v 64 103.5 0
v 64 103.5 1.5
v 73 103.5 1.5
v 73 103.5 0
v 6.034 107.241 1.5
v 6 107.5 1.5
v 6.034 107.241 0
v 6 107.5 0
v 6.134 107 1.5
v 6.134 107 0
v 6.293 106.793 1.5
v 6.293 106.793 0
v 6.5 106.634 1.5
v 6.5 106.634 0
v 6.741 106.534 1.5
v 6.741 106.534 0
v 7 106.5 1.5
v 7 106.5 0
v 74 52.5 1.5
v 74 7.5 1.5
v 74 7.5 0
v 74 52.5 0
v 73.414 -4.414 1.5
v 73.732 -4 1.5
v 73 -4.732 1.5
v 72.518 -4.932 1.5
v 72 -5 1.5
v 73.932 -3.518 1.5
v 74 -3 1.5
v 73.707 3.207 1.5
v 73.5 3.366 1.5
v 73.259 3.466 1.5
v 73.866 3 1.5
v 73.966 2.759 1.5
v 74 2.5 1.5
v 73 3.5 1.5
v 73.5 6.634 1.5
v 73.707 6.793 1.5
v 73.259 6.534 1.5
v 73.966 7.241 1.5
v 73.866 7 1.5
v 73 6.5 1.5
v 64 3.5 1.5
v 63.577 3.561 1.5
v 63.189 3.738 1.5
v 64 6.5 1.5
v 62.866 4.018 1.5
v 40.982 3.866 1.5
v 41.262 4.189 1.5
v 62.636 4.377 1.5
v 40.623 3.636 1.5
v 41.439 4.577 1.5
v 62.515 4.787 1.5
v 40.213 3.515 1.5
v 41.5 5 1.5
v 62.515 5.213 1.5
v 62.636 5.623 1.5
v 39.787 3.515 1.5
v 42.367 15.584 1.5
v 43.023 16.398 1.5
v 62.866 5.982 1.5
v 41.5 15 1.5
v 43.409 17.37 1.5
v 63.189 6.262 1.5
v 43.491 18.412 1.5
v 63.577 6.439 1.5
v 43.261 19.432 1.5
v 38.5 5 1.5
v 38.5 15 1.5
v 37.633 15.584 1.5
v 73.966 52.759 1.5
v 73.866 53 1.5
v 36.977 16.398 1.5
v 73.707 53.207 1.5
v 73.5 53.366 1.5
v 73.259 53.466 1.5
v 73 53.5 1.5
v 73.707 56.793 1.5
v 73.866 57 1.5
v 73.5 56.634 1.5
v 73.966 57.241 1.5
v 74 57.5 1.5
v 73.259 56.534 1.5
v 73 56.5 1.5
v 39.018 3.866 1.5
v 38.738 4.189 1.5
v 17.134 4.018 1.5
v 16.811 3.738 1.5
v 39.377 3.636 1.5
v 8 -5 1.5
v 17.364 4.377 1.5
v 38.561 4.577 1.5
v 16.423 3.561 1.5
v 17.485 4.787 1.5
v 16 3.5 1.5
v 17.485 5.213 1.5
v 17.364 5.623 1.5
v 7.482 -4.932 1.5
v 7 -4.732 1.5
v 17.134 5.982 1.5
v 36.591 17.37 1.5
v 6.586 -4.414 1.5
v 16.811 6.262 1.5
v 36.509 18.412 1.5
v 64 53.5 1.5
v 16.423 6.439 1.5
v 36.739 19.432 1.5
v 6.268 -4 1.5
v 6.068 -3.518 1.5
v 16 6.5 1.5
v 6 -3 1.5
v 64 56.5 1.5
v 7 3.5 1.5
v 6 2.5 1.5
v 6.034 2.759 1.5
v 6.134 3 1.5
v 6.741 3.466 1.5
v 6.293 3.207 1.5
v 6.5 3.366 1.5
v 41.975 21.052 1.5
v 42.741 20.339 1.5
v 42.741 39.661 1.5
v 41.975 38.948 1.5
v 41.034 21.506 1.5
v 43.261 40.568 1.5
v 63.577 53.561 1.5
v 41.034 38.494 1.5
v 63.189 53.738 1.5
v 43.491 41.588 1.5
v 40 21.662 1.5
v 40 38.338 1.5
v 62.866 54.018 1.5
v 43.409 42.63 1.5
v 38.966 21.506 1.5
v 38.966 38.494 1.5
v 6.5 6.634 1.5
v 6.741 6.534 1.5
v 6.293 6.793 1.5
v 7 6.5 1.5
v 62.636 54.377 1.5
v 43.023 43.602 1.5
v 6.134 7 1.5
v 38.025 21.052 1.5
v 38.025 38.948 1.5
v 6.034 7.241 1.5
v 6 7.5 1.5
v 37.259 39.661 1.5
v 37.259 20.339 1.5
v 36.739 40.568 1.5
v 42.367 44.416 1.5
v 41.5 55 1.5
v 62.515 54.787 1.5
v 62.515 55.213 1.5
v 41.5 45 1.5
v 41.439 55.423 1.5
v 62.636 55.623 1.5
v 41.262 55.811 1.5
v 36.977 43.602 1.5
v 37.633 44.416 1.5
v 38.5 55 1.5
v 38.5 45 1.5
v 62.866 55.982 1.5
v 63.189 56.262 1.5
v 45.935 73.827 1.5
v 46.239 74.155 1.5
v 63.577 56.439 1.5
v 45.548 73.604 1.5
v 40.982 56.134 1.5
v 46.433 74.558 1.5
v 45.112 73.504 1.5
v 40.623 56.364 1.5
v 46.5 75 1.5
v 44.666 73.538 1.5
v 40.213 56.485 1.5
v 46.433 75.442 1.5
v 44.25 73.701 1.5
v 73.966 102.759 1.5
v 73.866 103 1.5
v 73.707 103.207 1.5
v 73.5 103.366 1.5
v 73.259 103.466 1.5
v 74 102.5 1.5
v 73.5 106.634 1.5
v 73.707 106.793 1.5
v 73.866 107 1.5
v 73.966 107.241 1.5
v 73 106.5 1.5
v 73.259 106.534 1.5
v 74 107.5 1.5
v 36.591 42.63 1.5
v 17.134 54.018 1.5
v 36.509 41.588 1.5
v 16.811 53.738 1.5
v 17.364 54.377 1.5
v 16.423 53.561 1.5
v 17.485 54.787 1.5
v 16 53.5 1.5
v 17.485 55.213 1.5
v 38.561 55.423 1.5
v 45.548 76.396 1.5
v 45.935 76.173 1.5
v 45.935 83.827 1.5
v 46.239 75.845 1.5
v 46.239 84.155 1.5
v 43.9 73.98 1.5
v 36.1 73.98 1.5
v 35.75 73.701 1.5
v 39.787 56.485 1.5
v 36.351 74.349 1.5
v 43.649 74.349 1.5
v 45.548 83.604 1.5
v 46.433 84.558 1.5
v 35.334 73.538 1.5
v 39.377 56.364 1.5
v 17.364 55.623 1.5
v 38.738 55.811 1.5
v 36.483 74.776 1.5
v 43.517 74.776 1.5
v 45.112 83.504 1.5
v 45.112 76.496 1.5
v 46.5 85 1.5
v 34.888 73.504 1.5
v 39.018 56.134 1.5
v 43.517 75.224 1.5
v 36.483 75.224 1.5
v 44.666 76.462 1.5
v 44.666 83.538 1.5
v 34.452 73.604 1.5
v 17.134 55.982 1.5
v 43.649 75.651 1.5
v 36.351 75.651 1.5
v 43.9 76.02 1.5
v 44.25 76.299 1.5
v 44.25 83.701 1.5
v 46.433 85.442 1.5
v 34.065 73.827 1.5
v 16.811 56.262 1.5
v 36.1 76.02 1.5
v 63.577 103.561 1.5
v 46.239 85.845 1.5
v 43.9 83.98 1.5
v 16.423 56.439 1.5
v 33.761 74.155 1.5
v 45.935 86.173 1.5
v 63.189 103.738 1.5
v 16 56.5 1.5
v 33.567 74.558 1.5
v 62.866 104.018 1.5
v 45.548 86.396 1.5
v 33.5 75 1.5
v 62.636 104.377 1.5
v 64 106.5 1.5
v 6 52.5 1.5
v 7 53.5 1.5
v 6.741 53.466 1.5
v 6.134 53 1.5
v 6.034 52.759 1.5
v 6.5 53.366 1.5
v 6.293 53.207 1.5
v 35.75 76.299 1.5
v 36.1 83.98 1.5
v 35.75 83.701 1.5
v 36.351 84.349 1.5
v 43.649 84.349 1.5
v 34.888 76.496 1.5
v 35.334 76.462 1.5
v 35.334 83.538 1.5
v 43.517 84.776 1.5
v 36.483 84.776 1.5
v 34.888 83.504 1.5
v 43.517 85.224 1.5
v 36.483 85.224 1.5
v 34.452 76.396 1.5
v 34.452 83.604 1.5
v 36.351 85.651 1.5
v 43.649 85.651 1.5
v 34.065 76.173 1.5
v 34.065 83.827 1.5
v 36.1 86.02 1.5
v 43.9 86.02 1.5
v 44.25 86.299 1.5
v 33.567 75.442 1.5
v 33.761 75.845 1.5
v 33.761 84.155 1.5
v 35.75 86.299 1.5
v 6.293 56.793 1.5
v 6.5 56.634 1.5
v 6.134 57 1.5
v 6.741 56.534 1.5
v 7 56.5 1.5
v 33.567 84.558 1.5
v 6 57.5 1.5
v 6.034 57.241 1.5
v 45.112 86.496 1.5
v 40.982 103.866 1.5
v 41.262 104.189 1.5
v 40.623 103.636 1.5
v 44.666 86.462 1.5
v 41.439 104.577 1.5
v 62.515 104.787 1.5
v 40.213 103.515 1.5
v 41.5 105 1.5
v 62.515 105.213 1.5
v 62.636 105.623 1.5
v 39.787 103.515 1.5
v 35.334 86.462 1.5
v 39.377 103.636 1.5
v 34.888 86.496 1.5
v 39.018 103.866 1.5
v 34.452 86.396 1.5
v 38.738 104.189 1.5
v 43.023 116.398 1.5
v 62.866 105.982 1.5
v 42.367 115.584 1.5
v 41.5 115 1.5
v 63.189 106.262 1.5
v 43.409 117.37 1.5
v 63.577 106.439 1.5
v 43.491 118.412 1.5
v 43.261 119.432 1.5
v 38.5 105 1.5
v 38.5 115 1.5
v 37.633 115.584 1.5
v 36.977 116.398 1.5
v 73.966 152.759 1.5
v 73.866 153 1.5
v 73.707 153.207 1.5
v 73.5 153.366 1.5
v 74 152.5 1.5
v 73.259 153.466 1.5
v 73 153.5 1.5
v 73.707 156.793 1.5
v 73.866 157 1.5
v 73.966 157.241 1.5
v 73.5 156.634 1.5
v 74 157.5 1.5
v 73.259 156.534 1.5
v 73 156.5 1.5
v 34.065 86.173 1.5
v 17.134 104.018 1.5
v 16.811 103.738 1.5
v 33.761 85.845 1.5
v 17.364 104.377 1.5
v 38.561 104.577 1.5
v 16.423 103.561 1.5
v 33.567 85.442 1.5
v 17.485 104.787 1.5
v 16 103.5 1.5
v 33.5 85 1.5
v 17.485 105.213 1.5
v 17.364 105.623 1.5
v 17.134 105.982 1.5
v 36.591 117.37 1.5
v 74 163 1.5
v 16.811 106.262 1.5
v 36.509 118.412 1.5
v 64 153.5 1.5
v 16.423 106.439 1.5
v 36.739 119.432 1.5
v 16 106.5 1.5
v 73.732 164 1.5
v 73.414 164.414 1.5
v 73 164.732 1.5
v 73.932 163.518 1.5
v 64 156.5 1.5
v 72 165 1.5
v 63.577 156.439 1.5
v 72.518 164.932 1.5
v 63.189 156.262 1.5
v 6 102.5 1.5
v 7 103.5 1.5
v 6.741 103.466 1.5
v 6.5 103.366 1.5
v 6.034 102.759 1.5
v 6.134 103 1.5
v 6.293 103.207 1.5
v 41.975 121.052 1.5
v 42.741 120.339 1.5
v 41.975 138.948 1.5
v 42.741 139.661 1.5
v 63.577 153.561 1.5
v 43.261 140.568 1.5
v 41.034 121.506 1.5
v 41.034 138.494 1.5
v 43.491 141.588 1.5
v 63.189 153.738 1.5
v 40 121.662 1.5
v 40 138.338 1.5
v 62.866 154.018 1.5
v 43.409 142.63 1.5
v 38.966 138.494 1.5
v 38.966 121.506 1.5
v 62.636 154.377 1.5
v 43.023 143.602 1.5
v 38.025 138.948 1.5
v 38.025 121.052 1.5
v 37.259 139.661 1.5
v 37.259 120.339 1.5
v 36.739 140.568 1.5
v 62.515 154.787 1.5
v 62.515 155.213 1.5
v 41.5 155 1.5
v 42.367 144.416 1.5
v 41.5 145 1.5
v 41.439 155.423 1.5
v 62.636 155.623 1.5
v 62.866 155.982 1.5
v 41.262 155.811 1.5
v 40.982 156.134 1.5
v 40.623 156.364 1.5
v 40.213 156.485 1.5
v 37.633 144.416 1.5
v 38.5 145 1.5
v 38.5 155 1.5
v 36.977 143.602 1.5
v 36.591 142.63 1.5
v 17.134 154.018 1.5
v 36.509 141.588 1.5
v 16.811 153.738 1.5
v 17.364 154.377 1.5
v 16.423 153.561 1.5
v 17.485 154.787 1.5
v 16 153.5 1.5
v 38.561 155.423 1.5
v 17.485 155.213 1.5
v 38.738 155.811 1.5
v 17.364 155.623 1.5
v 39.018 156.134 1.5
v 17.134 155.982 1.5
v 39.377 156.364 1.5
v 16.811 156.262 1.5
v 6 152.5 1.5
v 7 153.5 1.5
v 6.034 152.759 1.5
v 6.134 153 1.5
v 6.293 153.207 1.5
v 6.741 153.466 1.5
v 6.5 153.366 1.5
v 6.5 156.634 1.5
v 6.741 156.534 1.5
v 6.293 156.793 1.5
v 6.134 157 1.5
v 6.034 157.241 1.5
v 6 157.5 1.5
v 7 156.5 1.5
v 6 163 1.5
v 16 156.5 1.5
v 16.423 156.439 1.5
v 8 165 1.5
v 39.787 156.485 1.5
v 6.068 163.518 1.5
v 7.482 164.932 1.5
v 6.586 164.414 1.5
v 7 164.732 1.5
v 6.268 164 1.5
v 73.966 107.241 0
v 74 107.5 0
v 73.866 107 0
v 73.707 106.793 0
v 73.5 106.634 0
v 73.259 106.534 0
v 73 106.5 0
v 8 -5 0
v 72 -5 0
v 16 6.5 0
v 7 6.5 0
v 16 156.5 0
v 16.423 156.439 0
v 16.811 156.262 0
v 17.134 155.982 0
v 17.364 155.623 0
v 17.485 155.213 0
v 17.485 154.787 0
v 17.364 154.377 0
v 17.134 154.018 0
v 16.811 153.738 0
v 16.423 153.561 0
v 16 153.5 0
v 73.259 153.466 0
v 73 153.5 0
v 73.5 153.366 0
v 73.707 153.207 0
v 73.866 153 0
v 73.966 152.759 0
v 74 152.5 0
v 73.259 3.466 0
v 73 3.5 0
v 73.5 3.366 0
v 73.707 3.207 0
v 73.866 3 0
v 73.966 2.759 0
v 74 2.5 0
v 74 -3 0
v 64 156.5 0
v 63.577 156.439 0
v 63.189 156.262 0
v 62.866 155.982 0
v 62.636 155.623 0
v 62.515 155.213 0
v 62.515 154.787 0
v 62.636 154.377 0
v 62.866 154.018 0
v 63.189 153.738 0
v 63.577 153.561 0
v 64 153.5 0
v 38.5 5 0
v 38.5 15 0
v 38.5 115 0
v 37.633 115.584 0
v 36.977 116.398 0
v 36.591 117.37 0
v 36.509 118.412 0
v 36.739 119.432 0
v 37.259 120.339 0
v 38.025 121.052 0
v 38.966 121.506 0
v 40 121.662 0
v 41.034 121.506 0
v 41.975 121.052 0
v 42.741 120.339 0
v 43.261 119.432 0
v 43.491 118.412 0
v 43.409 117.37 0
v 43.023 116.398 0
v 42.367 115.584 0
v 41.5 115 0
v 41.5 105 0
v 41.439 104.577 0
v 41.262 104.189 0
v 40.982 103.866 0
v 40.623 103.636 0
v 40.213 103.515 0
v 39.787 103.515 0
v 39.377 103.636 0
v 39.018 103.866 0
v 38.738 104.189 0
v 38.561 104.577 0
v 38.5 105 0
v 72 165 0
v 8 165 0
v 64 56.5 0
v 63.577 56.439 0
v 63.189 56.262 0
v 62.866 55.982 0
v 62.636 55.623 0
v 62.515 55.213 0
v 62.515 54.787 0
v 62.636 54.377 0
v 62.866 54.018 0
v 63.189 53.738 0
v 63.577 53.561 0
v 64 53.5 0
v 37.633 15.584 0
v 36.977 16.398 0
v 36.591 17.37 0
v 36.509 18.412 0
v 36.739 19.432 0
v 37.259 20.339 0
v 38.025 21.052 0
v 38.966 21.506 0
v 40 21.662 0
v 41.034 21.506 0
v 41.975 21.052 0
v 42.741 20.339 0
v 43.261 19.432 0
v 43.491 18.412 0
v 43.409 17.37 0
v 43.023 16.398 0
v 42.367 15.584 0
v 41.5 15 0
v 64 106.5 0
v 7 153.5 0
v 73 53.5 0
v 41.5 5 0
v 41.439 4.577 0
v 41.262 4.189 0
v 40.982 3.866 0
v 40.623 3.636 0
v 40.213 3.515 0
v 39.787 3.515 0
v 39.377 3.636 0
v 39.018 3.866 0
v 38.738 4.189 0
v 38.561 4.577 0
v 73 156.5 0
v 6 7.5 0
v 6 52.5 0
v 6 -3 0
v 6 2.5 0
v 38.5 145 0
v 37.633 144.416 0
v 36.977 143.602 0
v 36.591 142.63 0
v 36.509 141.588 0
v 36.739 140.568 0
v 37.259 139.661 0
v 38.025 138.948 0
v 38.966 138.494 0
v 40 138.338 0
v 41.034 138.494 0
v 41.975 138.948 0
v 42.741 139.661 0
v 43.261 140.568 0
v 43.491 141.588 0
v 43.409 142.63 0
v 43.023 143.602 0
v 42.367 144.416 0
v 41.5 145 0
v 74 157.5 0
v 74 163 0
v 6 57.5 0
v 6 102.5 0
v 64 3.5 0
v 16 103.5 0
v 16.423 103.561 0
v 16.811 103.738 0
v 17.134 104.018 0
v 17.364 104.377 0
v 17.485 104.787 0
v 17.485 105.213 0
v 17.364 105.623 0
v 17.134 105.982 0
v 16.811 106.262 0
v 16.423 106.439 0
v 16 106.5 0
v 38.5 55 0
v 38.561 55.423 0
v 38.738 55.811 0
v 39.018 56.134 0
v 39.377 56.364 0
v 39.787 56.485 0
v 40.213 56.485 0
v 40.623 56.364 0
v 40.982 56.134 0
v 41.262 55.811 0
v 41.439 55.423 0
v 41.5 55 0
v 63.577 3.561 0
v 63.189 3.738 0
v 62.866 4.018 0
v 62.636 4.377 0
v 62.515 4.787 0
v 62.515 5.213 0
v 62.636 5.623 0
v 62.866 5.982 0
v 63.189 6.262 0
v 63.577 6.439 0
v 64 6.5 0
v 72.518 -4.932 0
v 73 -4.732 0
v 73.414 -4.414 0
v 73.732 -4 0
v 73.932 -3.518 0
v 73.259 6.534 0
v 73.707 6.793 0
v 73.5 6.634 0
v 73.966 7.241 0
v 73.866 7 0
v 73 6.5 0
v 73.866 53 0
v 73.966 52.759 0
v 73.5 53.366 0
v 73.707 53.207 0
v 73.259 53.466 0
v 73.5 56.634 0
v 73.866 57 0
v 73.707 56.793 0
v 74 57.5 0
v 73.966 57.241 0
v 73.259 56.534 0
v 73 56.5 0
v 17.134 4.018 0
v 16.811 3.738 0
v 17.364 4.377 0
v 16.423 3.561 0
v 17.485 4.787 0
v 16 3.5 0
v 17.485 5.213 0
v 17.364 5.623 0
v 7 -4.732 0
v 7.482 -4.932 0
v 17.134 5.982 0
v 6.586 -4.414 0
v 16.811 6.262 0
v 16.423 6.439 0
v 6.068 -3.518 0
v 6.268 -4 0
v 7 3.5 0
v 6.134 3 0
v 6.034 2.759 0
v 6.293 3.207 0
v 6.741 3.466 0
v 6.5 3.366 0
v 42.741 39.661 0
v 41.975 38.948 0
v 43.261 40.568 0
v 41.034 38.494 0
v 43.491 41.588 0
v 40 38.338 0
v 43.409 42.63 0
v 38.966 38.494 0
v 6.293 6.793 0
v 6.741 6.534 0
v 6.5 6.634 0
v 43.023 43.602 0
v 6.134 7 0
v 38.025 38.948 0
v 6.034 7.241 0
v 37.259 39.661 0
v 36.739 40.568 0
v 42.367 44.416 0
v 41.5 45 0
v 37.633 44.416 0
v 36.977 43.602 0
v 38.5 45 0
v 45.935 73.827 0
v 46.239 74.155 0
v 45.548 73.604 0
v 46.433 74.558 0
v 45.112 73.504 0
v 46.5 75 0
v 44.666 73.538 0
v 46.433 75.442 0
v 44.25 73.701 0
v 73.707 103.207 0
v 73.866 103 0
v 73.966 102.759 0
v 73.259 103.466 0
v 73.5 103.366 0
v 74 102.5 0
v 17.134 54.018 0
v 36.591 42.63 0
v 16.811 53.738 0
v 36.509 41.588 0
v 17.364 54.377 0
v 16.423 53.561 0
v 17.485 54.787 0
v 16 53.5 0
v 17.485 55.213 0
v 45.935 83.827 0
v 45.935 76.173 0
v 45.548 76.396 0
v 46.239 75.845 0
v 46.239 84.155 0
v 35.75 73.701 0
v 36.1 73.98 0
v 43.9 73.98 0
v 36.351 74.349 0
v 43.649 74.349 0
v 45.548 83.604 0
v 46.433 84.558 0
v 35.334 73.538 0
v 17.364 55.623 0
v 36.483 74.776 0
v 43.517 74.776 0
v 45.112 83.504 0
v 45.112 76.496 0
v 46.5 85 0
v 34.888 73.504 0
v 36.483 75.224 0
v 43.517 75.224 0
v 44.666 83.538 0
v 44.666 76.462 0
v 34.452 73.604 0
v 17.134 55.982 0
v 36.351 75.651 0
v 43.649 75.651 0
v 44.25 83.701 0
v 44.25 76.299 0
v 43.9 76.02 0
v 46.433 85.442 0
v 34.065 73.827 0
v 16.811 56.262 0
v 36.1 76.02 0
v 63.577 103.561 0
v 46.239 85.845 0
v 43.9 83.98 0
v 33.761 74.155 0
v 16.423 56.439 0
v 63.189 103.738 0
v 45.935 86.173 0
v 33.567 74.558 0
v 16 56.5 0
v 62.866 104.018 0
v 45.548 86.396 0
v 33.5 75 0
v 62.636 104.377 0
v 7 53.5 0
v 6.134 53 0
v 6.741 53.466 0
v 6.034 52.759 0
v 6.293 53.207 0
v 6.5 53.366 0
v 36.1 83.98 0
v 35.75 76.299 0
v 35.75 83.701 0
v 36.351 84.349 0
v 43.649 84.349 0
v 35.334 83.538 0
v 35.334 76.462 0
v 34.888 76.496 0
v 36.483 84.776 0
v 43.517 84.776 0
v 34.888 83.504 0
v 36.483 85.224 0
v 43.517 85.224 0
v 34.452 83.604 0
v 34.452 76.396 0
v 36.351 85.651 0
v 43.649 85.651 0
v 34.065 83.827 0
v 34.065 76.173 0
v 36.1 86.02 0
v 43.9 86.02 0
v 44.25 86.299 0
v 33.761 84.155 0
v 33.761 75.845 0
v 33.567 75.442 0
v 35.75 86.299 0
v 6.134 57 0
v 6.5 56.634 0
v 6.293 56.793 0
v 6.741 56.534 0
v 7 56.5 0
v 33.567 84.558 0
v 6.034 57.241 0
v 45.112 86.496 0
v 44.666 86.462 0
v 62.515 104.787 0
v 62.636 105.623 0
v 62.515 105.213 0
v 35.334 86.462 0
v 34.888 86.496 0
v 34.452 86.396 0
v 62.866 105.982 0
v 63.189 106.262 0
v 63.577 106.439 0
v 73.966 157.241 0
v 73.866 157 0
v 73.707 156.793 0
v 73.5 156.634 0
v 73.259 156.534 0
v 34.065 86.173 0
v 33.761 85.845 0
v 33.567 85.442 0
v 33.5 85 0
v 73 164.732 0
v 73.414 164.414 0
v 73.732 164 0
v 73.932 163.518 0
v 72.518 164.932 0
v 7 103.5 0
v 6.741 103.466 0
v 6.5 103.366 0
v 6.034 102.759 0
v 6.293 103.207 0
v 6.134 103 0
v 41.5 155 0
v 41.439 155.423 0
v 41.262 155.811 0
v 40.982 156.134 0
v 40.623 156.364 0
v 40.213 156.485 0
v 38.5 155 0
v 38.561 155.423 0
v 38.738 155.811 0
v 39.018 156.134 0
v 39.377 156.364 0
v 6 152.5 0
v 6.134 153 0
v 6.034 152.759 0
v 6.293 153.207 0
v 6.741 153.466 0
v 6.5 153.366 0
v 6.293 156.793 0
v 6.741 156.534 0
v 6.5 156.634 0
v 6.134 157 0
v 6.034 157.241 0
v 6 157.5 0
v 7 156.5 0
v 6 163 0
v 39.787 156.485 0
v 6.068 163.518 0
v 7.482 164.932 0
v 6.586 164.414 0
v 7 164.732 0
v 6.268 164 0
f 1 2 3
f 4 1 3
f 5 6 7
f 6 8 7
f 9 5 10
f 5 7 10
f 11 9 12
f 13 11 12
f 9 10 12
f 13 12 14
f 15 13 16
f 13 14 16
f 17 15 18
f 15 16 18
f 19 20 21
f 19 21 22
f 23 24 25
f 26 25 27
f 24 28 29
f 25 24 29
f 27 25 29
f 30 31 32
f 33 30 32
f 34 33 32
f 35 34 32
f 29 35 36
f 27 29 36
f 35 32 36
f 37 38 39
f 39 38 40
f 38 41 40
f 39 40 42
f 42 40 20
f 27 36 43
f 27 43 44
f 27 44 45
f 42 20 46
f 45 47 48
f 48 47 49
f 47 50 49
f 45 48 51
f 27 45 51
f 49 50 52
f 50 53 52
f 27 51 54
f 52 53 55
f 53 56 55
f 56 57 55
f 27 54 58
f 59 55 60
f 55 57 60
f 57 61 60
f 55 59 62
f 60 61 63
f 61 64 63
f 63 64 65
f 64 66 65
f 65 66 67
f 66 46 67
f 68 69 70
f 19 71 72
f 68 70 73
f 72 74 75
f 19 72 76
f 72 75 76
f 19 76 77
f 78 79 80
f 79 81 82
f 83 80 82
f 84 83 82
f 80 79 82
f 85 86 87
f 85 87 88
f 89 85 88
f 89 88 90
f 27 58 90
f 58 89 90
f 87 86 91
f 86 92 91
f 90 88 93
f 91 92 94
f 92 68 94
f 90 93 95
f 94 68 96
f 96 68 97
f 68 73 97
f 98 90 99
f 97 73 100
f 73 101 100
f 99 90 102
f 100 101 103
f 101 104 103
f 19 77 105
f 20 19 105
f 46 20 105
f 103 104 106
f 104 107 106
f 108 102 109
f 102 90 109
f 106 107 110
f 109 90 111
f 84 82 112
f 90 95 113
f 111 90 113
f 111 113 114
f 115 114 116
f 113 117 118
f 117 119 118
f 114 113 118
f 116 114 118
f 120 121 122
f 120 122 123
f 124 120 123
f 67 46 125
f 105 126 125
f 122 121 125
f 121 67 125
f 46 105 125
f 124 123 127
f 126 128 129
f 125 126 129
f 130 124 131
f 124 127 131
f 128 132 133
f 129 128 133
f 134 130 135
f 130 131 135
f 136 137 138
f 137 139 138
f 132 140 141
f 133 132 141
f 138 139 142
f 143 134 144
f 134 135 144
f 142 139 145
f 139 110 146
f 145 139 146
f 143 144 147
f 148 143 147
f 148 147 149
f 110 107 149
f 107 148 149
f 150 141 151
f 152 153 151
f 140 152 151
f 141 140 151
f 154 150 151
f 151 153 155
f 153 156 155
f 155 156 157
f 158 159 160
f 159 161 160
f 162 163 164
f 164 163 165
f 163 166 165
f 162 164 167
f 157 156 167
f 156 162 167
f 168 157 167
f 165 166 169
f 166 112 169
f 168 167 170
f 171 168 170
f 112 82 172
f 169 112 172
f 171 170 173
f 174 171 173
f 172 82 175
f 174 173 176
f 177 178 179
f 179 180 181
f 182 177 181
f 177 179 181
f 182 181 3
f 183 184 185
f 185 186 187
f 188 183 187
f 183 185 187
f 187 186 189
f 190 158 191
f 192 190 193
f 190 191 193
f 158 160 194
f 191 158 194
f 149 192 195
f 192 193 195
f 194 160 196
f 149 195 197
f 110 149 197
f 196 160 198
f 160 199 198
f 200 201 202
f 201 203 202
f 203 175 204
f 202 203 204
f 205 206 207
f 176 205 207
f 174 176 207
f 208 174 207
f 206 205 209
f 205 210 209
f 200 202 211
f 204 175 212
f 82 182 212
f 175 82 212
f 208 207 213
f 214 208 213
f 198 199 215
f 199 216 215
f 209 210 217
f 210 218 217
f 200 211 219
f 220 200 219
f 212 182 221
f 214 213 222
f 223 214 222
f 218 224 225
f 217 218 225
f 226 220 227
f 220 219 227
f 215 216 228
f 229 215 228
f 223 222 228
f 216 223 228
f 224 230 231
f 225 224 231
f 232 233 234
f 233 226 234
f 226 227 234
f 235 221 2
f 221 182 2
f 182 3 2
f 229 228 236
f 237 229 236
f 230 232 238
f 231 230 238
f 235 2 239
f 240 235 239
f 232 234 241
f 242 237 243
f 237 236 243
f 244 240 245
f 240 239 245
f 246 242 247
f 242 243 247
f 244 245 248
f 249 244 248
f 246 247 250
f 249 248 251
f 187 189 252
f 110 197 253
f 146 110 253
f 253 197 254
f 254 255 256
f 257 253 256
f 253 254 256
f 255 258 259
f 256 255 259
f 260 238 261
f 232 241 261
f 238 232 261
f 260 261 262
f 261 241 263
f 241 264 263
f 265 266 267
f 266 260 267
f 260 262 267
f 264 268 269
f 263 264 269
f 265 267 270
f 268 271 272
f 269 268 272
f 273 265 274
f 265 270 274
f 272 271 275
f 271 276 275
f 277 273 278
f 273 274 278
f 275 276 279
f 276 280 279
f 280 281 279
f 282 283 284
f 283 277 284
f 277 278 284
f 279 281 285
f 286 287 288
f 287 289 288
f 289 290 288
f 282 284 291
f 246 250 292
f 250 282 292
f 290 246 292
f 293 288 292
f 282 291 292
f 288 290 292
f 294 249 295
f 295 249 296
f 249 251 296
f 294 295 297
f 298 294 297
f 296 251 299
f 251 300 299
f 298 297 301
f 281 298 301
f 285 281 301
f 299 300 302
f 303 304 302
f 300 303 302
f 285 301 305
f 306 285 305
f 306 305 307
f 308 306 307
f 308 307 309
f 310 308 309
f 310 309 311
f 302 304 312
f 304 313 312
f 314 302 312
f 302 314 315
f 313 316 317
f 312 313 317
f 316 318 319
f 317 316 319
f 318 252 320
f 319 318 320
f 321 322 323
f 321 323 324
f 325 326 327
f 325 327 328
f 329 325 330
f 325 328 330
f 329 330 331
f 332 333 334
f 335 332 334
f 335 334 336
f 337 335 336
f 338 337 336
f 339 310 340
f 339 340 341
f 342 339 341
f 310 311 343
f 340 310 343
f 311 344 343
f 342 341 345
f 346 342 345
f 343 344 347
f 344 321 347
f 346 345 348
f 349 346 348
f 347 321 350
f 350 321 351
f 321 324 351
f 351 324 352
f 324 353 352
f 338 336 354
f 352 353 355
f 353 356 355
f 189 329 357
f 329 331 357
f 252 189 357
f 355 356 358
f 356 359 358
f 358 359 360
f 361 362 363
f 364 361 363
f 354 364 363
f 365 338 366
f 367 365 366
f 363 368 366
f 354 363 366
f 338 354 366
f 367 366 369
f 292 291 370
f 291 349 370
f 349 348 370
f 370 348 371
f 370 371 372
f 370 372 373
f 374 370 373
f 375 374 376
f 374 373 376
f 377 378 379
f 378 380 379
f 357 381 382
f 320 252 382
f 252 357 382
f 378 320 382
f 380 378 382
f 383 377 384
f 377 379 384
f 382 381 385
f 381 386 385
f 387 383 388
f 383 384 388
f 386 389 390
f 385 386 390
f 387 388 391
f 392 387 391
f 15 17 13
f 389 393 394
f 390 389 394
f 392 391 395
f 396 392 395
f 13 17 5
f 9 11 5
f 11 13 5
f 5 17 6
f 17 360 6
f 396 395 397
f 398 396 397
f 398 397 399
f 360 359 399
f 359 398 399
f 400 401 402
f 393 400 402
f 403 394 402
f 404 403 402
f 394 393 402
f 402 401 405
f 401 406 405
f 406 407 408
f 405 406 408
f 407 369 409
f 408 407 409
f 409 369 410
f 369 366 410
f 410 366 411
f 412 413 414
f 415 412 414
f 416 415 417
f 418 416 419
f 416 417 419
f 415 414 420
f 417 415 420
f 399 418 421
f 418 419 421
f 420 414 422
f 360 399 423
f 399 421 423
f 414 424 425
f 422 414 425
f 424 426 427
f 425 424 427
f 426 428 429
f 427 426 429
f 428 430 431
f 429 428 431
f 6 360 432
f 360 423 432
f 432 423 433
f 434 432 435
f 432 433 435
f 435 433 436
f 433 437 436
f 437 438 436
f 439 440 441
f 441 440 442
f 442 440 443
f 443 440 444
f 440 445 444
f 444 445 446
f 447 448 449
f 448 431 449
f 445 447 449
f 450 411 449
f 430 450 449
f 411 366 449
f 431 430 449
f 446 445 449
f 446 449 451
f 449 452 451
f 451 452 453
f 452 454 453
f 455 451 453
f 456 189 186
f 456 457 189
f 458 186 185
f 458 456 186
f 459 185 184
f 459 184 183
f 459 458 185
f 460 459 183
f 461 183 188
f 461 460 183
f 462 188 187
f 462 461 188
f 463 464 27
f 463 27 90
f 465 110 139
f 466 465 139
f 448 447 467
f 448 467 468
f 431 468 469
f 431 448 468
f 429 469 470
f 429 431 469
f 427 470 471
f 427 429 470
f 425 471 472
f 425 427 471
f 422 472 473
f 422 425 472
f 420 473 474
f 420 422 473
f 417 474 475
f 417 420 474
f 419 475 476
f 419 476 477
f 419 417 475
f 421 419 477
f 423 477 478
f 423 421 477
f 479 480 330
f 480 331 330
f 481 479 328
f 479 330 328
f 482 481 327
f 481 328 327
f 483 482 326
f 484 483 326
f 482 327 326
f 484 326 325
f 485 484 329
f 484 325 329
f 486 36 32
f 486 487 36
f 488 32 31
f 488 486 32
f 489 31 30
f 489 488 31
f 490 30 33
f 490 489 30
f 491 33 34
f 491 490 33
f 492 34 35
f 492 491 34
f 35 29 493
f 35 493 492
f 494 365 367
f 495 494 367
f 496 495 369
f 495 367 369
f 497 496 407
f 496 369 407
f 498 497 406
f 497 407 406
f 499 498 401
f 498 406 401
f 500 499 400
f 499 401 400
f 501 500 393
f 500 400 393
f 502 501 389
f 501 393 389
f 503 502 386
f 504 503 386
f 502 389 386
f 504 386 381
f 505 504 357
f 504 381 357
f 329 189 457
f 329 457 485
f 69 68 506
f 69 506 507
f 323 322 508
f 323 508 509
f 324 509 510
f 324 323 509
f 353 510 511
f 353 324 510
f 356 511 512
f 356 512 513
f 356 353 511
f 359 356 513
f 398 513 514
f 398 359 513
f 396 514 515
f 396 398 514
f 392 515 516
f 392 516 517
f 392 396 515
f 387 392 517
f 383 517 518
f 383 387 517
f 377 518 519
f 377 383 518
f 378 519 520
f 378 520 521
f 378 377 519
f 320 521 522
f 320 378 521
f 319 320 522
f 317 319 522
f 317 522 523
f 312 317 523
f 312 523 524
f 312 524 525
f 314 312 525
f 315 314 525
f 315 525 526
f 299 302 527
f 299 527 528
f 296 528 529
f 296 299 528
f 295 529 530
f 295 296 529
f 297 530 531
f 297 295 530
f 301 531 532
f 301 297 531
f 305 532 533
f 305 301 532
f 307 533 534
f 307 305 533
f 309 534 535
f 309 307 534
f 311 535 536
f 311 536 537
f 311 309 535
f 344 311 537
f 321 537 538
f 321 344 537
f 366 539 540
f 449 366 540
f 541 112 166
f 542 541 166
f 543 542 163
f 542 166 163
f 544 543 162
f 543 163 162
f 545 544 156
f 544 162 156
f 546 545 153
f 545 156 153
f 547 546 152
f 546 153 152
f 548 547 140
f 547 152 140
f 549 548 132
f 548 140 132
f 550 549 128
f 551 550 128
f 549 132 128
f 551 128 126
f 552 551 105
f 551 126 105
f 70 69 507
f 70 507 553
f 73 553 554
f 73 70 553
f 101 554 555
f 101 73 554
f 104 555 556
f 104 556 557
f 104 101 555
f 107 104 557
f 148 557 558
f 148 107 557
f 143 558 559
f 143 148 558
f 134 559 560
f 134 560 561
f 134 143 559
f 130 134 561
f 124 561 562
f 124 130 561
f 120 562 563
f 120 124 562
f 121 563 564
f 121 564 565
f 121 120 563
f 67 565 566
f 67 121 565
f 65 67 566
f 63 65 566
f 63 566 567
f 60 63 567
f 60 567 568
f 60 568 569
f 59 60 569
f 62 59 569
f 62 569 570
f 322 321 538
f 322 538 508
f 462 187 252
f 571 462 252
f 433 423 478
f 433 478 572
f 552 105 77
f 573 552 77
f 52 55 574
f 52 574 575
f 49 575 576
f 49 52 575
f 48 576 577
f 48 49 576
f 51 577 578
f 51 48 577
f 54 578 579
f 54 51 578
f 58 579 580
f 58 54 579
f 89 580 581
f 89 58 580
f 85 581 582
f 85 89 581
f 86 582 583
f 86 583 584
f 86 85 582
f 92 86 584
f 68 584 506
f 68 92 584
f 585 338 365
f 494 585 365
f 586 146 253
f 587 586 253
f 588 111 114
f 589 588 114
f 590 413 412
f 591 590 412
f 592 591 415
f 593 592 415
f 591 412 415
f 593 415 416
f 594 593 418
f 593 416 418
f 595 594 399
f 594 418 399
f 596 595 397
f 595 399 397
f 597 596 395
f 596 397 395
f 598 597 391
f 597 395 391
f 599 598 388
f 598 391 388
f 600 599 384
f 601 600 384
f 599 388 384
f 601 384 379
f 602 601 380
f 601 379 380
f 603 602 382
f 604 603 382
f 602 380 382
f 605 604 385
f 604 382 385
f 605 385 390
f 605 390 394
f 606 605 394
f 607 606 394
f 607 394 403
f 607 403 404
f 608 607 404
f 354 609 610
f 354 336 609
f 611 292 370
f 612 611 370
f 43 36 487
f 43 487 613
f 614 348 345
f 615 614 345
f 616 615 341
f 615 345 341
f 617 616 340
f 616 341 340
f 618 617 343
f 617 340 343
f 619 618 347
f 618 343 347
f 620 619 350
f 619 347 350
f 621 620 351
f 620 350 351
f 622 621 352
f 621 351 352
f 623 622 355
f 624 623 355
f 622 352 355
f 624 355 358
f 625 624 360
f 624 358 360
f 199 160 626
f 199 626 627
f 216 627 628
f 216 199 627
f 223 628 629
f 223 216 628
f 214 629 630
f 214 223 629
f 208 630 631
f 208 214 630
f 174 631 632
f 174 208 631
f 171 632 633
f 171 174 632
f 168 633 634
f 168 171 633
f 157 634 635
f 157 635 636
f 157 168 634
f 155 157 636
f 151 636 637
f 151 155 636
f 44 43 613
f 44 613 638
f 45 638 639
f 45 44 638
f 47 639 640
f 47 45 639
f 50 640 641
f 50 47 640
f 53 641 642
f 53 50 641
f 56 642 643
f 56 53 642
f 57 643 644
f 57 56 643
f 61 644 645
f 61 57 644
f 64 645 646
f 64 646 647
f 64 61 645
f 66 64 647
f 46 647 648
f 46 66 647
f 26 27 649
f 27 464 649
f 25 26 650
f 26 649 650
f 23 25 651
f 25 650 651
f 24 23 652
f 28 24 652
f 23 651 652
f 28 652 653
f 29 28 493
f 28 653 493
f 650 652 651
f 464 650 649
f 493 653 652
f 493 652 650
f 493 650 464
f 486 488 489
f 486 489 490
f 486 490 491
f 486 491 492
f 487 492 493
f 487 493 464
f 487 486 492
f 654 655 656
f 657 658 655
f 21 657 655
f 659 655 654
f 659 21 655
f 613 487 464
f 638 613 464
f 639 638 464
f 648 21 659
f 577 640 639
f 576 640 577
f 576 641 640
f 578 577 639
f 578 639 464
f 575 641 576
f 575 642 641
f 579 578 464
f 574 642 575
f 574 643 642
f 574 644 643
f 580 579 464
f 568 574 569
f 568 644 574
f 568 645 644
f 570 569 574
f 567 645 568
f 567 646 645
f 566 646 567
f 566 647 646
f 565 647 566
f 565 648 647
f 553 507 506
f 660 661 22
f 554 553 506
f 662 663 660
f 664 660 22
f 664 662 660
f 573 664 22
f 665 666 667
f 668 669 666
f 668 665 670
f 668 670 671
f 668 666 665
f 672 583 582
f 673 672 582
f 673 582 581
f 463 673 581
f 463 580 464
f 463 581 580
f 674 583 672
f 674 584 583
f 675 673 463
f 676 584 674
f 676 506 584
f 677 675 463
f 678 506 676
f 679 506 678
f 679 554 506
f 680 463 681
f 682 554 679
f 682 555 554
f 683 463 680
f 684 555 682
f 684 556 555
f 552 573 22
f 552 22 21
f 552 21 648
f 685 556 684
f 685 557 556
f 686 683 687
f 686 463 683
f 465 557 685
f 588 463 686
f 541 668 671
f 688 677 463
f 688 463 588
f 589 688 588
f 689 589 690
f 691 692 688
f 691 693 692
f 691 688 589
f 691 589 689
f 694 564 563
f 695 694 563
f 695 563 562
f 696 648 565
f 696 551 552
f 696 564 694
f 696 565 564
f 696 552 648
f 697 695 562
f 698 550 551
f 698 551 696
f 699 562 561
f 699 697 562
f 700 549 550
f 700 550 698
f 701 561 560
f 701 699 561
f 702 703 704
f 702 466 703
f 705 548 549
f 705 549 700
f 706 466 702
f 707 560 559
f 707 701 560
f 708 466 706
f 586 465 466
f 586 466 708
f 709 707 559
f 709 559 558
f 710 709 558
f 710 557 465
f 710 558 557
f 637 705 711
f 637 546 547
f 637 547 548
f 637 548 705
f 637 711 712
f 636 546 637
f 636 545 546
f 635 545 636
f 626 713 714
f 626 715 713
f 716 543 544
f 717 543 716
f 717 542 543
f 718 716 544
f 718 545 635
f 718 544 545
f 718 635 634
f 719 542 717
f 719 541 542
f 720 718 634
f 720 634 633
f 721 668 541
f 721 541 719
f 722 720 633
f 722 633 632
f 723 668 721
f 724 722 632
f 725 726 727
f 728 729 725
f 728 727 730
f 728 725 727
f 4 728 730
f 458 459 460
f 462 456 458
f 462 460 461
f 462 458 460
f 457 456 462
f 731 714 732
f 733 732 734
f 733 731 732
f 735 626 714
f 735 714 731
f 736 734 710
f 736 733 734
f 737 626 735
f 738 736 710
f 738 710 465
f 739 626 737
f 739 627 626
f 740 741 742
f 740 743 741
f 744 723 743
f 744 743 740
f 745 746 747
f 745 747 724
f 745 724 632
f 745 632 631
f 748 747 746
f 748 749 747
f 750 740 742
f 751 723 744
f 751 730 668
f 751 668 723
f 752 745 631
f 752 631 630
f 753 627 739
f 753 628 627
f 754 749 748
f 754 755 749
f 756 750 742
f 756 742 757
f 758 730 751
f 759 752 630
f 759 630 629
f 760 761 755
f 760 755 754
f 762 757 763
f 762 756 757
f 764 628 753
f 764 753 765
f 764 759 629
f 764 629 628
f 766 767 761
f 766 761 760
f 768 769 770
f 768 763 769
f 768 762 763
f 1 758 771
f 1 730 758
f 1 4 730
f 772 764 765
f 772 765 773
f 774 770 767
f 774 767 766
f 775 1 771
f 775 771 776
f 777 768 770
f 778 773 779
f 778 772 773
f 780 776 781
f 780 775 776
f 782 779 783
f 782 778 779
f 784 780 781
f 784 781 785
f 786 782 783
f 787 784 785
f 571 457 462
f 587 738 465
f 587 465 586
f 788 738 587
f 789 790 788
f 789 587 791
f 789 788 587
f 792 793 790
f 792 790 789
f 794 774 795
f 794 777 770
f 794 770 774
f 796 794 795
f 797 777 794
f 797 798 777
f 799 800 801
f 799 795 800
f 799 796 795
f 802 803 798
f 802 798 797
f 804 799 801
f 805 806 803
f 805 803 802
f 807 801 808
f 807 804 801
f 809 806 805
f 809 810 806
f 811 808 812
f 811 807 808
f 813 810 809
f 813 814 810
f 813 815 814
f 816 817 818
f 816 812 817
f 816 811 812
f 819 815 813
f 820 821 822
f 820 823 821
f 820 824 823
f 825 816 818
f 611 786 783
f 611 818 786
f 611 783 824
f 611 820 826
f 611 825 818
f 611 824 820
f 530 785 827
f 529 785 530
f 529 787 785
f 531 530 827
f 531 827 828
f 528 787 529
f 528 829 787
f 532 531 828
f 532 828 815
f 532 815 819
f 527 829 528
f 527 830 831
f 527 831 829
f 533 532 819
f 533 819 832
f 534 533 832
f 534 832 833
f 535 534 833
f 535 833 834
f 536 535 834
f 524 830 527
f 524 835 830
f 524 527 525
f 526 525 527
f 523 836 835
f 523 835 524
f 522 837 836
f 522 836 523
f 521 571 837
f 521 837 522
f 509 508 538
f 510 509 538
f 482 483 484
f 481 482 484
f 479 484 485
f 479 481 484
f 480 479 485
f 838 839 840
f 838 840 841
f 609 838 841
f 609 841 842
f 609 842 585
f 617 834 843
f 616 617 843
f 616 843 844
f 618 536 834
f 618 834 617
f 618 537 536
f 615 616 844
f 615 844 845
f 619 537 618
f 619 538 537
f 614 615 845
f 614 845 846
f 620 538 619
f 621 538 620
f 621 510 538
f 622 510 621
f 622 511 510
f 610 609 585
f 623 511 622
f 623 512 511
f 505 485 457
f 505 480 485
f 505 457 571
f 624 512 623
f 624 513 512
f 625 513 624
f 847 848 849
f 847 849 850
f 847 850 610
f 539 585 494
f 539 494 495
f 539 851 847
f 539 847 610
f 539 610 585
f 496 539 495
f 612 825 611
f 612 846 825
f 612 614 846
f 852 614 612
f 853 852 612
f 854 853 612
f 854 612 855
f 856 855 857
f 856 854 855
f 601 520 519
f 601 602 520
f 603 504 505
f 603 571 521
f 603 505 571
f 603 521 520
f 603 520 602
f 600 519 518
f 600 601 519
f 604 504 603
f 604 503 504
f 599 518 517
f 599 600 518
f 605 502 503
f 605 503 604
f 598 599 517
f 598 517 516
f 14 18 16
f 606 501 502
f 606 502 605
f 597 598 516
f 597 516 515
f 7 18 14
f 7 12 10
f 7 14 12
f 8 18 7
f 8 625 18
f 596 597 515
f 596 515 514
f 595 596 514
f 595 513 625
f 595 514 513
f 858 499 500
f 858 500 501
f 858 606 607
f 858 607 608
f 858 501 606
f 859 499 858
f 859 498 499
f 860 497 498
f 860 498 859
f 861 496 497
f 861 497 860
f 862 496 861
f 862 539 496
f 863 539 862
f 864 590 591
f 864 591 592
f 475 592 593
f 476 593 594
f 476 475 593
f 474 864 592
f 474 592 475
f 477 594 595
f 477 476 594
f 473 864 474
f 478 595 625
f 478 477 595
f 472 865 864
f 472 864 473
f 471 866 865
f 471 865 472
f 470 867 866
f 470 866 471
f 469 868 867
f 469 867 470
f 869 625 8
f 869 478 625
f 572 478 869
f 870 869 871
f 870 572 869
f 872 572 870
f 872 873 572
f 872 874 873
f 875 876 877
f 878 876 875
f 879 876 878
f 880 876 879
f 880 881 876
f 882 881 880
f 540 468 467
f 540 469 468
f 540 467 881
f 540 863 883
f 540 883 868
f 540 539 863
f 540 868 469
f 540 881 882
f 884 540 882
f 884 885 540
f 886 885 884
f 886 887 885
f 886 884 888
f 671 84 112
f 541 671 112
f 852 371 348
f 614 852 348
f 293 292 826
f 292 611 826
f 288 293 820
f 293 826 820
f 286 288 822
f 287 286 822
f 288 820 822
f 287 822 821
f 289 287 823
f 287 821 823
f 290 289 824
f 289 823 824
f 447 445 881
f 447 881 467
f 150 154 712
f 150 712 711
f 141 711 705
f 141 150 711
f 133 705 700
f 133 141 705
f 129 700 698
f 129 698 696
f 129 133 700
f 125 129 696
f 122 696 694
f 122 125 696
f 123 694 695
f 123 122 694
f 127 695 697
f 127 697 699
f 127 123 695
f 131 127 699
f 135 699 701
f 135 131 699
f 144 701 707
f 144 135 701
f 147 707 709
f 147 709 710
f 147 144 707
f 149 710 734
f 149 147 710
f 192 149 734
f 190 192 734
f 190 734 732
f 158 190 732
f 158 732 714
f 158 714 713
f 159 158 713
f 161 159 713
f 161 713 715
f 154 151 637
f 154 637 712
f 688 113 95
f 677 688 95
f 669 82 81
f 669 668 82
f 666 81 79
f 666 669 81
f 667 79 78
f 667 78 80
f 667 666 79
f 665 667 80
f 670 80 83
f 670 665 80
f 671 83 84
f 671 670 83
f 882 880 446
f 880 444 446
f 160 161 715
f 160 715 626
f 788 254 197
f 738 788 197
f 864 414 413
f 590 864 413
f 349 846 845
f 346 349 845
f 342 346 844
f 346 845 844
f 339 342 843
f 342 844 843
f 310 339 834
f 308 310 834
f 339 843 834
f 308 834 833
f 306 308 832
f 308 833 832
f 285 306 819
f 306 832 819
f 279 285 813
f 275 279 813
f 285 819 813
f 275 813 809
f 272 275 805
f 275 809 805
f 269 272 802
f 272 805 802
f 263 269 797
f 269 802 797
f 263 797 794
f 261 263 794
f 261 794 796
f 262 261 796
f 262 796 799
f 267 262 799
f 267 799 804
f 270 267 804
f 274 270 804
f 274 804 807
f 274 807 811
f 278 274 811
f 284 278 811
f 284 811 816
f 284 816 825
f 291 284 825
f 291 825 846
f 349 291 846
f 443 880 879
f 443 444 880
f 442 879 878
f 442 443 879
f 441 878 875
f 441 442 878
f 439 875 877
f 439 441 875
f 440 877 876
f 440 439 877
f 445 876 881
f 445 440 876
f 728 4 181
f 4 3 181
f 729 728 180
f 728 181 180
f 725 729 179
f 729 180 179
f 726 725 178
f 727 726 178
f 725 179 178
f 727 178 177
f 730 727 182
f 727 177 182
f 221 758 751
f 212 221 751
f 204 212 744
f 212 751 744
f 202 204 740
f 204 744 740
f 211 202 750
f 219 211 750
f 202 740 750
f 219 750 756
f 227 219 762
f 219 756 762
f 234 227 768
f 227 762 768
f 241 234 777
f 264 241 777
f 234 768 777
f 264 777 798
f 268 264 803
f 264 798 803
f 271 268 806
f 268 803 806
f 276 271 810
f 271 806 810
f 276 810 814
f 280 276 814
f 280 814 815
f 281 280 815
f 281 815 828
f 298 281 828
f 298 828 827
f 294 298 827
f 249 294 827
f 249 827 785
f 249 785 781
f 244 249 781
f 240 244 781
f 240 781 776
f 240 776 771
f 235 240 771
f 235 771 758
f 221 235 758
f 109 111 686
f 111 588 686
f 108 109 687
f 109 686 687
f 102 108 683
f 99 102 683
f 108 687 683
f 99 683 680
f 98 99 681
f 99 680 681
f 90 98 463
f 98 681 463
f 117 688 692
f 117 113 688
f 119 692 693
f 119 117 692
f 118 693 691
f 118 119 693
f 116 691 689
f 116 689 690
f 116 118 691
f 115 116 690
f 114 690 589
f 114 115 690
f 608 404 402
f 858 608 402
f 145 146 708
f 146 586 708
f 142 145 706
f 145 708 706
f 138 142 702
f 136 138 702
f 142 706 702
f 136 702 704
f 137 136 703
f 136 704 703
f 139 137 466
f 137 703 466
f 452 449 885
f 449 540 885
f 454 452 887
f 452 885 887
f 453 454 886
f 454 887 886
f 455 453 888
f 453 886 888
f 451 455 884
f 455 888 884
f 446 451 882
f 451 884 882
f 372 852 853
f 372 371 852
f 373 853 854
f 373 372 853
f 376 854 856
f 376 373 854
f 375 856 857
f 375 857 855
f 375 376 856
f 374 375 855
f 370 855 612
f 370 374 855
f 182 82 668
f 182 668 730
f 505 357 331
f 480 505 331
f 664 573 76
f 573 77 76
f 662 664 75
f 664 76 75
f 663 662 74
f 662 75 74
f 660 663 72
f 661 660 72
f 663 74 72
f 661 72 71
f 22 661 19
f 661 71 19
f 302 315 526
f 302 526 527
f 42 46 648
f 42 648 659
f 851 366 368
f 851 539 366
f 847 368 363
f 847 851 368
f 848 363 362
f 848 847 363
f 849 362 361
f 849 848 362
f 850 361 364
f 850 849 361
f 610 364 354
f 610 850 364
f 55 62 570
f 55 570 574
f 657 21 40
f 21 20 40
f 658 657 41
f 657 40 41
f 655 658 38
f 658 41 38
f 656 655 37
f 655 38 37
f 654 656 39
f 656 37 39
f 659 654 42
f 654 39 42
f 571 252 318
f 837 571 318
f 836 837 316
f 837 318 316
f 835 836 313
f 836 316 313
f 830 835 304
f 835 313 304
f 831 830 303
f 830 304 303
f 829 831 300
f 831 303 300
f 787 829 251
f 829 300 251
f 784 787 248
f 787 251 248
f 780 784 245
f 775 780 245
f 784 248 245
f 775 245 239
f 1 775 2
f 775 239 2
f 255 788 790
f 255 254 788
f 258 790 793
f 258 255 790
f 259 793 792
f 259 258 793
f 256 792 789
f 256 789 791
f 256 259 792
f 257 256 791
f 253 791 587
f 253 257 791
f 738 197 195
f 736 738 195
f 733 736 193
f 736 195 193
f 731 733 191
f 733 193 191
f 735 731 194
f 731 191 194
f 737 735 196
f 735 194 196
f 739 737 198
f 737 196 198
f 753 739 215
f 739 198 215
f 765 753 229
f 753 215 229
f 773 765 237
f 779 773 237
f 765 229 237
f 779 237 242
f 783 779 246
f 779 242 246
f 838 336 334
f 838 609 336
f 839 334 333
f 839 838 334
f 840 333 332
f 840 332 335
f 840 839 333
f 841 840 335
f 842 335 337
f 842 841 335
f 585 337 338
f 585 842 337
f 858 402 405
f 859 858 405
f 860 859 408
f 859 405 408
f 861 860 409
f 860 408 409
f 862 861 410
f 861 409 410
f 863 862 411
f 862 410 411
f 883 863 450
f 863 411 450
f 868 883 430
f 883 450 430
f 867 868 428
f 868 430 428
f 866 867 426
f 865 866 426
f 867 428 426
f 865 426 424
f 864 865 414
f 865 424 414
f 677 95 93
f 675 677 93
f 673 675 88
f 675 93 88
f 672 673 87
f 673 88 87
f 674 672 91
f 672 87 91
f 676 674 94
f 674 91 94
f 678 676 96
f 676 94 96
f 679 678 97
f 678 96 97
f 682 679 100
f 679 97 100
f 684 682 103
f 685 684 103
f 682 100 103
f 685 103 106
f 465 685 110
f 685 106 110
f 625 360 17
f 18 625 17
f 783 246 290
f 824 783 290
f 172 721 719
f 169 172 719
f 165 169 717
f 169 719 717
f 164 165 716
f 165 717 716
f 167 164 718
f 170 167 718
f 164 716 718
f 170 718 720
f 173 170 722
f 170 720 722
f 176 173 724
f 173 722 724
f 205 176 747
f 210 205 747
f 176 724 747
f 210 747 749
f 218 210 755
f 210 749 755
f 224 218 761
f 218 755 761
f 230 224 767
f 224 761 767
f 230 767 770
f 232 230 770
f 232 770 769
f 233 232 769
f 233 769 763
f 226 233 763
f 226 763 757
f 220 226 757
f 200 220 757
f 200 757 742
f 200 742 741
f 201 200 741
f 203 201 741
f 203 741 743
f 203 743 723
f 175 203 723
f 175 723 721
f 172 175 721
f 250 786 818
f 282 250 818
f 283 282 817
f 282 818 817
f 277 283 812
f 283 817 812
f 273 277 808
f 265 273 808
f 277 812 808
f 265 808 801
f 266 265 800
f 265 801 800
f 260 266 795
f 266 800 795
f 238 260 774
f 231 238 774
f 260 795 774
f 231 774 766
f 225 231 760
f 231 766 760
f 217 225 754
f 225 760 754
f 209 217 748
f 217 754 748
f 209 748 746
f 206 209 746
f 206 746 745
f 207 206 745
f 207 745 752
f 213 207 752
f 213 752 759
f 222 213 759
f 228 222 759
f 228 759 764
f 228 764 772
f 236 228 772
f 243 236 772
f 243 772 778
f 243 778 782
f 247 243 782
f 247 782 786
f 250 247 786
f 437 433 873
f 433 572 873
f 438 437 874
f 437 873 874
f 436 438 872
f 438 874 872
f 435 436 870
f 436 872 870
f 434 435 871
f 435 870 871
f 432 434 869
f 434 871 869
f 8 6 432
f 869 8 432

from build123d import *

# Parameters (mm, degrees)
EXTRUDE_1_DEPTH      = 1.5
CUT_EXTRUDE_1_DEPTH  = 1.5
SKETCH_3_R           = 2
CUT_EXTRUDE_2_DEPTH  = 1.5
SKETCH_4_W           = 80
SKETCH_4_H           = 5
EXTRUDE_2_DEPTH      = 1.5
FILLET_1_R           = 2
SKETCH_5_OUTSIDE_W   = 163.618
SKETCH_5_OUTSIDE_H   = 213.618
SKETCH_5_OUTSIDE_W_2 = 80
SKETCH_5_OUTSIDE_H_2 = 170
CUT_EXTRUDE_3_DEPTH  = 193.943644622
SKETCH_6_R           = 1.5
CUT_EXTRUDE_4_DEPTH  = 184.377343202
SKETCH_7_W           = 6
SKETCH_7_H           = 170
CUT_EXTRUDE_5_DEPTH  = 10
FILLET_2_R           = 2
FILLET_3_R           = 1
FILLET_4_R           = 1


with BuildPart() as part:
    # 草图1 → 凸台-拉伸1 (new body)
    with BuildSketch(Plane.XY):
        Polygon((80, 90), (100, 90), (100, 70), (80, 70), (80, 0), (0, 0), (0, 70), (-20, 70), (-20, 90), (0, 90), (0, 160), (80, 160), align=None)
    extrude(amount=EXTRUDE_1_DEPTH)

    # 草图2 → 切除-拉伸1 (cut)
    with BuildSketch(Plane.XY.offset(1.5)):
        with BuildLine():
            Line((64, 153.5), (80, 153.5))
            Line((80, 153.5), (80, 156.5))
            Line((80, 156.5), (64, 156.5))
            ThreePointArc((64, 156.5), (62.5, 155), (64, 153.5))
        make_face()
        with BuildLine():
            Line((38.5, 5), (38.5, 15))
            ThreePointArc((38.5, 15), (40, 21.66227766), (41.5, 15))
            Line((41.5, 15), (41.5, 5))
            ThreePointArc((41.5, 5), (40, 3.5), (38.5, 5))
        make_face()
        with BuildLine():
            Line((16, 153.5), (0, 153.5))
            Line((0, 153.5), (0, 156.5))
            Line((0, 156.5), (16, 156.5))
            ThreePointArc((16, 156.5), (17.5, 155), (16, 153.5))
        make_face()
        with BuildLine():
            Line((64, 103.5), (80, 103.5))
            Line((80, 103.5), (80, 106.5))
            Line((80, 106.5), (64, 106.5))
            ThreePointArc((64, 106.5), (62.5, 105), (64, 103.5))
        make_face()
        with BuildLine():
            Line((16, 106.5), (0, 106.5))
            Line((0, 106.5), (0, 103.5))
            Line((0, 103.5), (16, 103.5))
            ThreePointArc((16, 103.5), (17.5, 105), (16, 106.5))
        make_face()
        with BuildLine():
            Line((16, 56.5), (0, 56.5))
            Line((0, 56.5), (0, 53.5))
            Line((0, 53.5), (16, 53.5))
            ThreePointArc((16, 53.5), (17.5, 55), (16, 56.5))
        make_face()
        with BuildLine():
            Line((64, 53.5), (80, 53.5))
            Line((80, 53.5), (80, 56.5))
            Line((80, 56.5), (64, 56.5))
            ThreePointArc((64, 56.5), (62.5, 55), (64, 53.5))
        make_face()
        with BuildLine():
            Line((16, 6.5), (0, 6.5))
            Line((0, 6.5), (0, 3.5))
            Line((0, 3.5), (16, 3.5))
            ThreePointArc((16, 3.5), (17.5, 5), (16, 6.5))
        make_face()
        with BuildLine():
            Line((64, 6.5), (80, 6.5))
            Line((80, 6.5), (80, 3.5))
            Line((80, 3.5), (64, 3.5))
            ThreePointArc((64, 3.5), (62.5, 5), (64, 6.5))
        make_face()
        with BuildLine():
            Line((38.5, 155), (38.5, 145))
            ThreePointArc((38.5, 145), (40, 138.33772234), (41.5, 145))
            Line((41.5, 145), (41.5, 155))
            ThreePointArc((41.5, 155), (40, 156.5), (38.5, 155))
        make_face()
        with BuildLine():
            Line((41.5, 55), (41.5, 45))
            ThreePointArc((41.5, 45), (40, 38.33772234), (38.5, 45))
            Line((38.5, 45), (38.5, 55))
            ThreePointArc((38.5, 55), (40, 56.5), (41.5, 55))
        make_face()
        with BuildLine():
            Line((38.5, 105), (38.5, 115))
            ThreePointArc((38.5, 115), (40, 121.66227766), (41.5, 115))
            Line((41.5, 115), (41.5, 105))
            ThreePointArc((41.5, 105), (40, 103.5), (38.5, 105))
        make_face()
    extrude(amount=-CUT_EXTRUDE_1_DEPTH, mode=Mode.SUBTRACT)

    # 草图3 → 切除-拉伸2 (cut)
    with BuildSketch(Plane.XY.offset(1.5)):
        with Locations((90, 80)):
            Circle(SKETCH_3_R)
        with Locations((-10, 80)):
            Circle(SKETCH_3_R)
    extrude(amount=-CUT_EXTRUDE_2_DEPTH, mode=Mode.SUBTRACT)

    # 草图4 → 凸台-拉伸2 (add)
    with BuildSketch(Plane(origin=(0, 0, 0), x_dir=(-1, 0, 0), z_dir=(0, 0, -1))):
        with Locations((-40, 162.5)):
            Rectangle(SKETCH_4_W, SKETCH_4_H)
        with Locations((-40, -2.5)):
            Rectangle(SKETCH_4_W, SKETCH_4_H)
    extrude(amount=-EXTRUDE_2_DEPTH)

    # 圆角1
    fillet_1_edges = [part.edges().sort_by_distance(p)[0] for p in [
        (0, 165, 0.75),
        (80, 165, 0.75),
        (0, -5, 0.75),
        (80, -5, 0.75),
    ]]
    fillet(fillet_1_edges, radius=FILLET_1_R)

    # 草图5 outside → 切除-拉伸3 (cut, through all)
    with BuildSketch(Plane.XY.offset(1.5)):
        with Locations((40, 80)):
            Rectangle(SKETCH_5_OUTSIDE_W, SKETCH_5_OUTSIDE_H)
        with Locations((40, 80)):
            Rectangle(SKETCH_5_OUTSIDE_W_2, SKETCH_5_OUTSIDE_H_2, mode=Mode.SUBTRACT)
    extrude(amount=-CUT_EXTRUDE_3_DEPTH, mode=Mode.SUBTRACT)

    # 草图6 → 切除-拉伸4 (cut, through all)
    with BuildSketch(Plane(origin=(0, 0, 0), x_dir=(-1, 0, 0), z_dir=(0, 0, -1))):
        with Locations((-35, 85)):
            Circle(SKETCH_6_R)
        with Locations((-35, 75)):
            Circle(SKETCH_6_R)
        with Locations(Location((-45, 75, 0), (0, 0, 180))):
            Circle(SKETCH_6_R)
        with Locations(Location((-45, 85, 0), (0, 0, 180))):
            Circle(SKETCH_6_R)
    extrude(amount=-CUT_EXTRUDE_4_DEPTH, mode=Mode.SUBTRACT)

    # 草图7 → 切除-拉伸5 (cut)
    with BuildSketch(Plane.XY.offset(1.5)):
        with Locations((3, 80)):
            Rectangle(SKETCH_7_W, SKETCH_7_H)
        with Locations((77, 80)):
            Rectangle(SKETCH_7_W, SKETCH_7_H)
    extrude(amount=-CUT_EXTRUDE_5_DEPTH, mode=Mode.SUBTRACT)

    # 圆角2
    fillet_2_edges = [part.edges().sort_by_distance(p)[0] for p in [
        (6, 165, 0.75),
        (6, -5, 0.75),
        (74, -5, 0.75),
        (74, 165, 0.75),
    ]]
    fillet(fillet_2_edges, radius=FILLET_2_R)

    # 圆角3
    fillet_3_edges = [part.edges().sort_by_distance(p)[0] for p in [
        (6, 156.5, 0.75),
        (6, 153.5, 0.75),
    ]]
    fillet(fillet_3_edges, radius=FILLET_3_R)

    # 圆角4
    fillet_4_edges = [part.edges().sort_by_distance(p)[0] for p in [
        (6, 106.5, 0.75),
        (6, 103.5, 0.75),
        (6, 56.5, 0.75),
        (6, 3.5, 0.75),
        (6, 53.5, 0.75),
        (6, 6.5, 0.75),
        (74, 156.5, 0.75),
        (74, 153.5, 0.75),
        (74, 106.5, 0.75),
        (74, 3.5, 0.75),
        (74, 103.5, 0.75),
        (74, 56.5, 0.75),
        (74, 6.5, 0.75),
        (74, 53.5, 0.75),
    ]]
    fillet(fillet_4_edges, radius=FILLET_4_R)


solid = part.part
